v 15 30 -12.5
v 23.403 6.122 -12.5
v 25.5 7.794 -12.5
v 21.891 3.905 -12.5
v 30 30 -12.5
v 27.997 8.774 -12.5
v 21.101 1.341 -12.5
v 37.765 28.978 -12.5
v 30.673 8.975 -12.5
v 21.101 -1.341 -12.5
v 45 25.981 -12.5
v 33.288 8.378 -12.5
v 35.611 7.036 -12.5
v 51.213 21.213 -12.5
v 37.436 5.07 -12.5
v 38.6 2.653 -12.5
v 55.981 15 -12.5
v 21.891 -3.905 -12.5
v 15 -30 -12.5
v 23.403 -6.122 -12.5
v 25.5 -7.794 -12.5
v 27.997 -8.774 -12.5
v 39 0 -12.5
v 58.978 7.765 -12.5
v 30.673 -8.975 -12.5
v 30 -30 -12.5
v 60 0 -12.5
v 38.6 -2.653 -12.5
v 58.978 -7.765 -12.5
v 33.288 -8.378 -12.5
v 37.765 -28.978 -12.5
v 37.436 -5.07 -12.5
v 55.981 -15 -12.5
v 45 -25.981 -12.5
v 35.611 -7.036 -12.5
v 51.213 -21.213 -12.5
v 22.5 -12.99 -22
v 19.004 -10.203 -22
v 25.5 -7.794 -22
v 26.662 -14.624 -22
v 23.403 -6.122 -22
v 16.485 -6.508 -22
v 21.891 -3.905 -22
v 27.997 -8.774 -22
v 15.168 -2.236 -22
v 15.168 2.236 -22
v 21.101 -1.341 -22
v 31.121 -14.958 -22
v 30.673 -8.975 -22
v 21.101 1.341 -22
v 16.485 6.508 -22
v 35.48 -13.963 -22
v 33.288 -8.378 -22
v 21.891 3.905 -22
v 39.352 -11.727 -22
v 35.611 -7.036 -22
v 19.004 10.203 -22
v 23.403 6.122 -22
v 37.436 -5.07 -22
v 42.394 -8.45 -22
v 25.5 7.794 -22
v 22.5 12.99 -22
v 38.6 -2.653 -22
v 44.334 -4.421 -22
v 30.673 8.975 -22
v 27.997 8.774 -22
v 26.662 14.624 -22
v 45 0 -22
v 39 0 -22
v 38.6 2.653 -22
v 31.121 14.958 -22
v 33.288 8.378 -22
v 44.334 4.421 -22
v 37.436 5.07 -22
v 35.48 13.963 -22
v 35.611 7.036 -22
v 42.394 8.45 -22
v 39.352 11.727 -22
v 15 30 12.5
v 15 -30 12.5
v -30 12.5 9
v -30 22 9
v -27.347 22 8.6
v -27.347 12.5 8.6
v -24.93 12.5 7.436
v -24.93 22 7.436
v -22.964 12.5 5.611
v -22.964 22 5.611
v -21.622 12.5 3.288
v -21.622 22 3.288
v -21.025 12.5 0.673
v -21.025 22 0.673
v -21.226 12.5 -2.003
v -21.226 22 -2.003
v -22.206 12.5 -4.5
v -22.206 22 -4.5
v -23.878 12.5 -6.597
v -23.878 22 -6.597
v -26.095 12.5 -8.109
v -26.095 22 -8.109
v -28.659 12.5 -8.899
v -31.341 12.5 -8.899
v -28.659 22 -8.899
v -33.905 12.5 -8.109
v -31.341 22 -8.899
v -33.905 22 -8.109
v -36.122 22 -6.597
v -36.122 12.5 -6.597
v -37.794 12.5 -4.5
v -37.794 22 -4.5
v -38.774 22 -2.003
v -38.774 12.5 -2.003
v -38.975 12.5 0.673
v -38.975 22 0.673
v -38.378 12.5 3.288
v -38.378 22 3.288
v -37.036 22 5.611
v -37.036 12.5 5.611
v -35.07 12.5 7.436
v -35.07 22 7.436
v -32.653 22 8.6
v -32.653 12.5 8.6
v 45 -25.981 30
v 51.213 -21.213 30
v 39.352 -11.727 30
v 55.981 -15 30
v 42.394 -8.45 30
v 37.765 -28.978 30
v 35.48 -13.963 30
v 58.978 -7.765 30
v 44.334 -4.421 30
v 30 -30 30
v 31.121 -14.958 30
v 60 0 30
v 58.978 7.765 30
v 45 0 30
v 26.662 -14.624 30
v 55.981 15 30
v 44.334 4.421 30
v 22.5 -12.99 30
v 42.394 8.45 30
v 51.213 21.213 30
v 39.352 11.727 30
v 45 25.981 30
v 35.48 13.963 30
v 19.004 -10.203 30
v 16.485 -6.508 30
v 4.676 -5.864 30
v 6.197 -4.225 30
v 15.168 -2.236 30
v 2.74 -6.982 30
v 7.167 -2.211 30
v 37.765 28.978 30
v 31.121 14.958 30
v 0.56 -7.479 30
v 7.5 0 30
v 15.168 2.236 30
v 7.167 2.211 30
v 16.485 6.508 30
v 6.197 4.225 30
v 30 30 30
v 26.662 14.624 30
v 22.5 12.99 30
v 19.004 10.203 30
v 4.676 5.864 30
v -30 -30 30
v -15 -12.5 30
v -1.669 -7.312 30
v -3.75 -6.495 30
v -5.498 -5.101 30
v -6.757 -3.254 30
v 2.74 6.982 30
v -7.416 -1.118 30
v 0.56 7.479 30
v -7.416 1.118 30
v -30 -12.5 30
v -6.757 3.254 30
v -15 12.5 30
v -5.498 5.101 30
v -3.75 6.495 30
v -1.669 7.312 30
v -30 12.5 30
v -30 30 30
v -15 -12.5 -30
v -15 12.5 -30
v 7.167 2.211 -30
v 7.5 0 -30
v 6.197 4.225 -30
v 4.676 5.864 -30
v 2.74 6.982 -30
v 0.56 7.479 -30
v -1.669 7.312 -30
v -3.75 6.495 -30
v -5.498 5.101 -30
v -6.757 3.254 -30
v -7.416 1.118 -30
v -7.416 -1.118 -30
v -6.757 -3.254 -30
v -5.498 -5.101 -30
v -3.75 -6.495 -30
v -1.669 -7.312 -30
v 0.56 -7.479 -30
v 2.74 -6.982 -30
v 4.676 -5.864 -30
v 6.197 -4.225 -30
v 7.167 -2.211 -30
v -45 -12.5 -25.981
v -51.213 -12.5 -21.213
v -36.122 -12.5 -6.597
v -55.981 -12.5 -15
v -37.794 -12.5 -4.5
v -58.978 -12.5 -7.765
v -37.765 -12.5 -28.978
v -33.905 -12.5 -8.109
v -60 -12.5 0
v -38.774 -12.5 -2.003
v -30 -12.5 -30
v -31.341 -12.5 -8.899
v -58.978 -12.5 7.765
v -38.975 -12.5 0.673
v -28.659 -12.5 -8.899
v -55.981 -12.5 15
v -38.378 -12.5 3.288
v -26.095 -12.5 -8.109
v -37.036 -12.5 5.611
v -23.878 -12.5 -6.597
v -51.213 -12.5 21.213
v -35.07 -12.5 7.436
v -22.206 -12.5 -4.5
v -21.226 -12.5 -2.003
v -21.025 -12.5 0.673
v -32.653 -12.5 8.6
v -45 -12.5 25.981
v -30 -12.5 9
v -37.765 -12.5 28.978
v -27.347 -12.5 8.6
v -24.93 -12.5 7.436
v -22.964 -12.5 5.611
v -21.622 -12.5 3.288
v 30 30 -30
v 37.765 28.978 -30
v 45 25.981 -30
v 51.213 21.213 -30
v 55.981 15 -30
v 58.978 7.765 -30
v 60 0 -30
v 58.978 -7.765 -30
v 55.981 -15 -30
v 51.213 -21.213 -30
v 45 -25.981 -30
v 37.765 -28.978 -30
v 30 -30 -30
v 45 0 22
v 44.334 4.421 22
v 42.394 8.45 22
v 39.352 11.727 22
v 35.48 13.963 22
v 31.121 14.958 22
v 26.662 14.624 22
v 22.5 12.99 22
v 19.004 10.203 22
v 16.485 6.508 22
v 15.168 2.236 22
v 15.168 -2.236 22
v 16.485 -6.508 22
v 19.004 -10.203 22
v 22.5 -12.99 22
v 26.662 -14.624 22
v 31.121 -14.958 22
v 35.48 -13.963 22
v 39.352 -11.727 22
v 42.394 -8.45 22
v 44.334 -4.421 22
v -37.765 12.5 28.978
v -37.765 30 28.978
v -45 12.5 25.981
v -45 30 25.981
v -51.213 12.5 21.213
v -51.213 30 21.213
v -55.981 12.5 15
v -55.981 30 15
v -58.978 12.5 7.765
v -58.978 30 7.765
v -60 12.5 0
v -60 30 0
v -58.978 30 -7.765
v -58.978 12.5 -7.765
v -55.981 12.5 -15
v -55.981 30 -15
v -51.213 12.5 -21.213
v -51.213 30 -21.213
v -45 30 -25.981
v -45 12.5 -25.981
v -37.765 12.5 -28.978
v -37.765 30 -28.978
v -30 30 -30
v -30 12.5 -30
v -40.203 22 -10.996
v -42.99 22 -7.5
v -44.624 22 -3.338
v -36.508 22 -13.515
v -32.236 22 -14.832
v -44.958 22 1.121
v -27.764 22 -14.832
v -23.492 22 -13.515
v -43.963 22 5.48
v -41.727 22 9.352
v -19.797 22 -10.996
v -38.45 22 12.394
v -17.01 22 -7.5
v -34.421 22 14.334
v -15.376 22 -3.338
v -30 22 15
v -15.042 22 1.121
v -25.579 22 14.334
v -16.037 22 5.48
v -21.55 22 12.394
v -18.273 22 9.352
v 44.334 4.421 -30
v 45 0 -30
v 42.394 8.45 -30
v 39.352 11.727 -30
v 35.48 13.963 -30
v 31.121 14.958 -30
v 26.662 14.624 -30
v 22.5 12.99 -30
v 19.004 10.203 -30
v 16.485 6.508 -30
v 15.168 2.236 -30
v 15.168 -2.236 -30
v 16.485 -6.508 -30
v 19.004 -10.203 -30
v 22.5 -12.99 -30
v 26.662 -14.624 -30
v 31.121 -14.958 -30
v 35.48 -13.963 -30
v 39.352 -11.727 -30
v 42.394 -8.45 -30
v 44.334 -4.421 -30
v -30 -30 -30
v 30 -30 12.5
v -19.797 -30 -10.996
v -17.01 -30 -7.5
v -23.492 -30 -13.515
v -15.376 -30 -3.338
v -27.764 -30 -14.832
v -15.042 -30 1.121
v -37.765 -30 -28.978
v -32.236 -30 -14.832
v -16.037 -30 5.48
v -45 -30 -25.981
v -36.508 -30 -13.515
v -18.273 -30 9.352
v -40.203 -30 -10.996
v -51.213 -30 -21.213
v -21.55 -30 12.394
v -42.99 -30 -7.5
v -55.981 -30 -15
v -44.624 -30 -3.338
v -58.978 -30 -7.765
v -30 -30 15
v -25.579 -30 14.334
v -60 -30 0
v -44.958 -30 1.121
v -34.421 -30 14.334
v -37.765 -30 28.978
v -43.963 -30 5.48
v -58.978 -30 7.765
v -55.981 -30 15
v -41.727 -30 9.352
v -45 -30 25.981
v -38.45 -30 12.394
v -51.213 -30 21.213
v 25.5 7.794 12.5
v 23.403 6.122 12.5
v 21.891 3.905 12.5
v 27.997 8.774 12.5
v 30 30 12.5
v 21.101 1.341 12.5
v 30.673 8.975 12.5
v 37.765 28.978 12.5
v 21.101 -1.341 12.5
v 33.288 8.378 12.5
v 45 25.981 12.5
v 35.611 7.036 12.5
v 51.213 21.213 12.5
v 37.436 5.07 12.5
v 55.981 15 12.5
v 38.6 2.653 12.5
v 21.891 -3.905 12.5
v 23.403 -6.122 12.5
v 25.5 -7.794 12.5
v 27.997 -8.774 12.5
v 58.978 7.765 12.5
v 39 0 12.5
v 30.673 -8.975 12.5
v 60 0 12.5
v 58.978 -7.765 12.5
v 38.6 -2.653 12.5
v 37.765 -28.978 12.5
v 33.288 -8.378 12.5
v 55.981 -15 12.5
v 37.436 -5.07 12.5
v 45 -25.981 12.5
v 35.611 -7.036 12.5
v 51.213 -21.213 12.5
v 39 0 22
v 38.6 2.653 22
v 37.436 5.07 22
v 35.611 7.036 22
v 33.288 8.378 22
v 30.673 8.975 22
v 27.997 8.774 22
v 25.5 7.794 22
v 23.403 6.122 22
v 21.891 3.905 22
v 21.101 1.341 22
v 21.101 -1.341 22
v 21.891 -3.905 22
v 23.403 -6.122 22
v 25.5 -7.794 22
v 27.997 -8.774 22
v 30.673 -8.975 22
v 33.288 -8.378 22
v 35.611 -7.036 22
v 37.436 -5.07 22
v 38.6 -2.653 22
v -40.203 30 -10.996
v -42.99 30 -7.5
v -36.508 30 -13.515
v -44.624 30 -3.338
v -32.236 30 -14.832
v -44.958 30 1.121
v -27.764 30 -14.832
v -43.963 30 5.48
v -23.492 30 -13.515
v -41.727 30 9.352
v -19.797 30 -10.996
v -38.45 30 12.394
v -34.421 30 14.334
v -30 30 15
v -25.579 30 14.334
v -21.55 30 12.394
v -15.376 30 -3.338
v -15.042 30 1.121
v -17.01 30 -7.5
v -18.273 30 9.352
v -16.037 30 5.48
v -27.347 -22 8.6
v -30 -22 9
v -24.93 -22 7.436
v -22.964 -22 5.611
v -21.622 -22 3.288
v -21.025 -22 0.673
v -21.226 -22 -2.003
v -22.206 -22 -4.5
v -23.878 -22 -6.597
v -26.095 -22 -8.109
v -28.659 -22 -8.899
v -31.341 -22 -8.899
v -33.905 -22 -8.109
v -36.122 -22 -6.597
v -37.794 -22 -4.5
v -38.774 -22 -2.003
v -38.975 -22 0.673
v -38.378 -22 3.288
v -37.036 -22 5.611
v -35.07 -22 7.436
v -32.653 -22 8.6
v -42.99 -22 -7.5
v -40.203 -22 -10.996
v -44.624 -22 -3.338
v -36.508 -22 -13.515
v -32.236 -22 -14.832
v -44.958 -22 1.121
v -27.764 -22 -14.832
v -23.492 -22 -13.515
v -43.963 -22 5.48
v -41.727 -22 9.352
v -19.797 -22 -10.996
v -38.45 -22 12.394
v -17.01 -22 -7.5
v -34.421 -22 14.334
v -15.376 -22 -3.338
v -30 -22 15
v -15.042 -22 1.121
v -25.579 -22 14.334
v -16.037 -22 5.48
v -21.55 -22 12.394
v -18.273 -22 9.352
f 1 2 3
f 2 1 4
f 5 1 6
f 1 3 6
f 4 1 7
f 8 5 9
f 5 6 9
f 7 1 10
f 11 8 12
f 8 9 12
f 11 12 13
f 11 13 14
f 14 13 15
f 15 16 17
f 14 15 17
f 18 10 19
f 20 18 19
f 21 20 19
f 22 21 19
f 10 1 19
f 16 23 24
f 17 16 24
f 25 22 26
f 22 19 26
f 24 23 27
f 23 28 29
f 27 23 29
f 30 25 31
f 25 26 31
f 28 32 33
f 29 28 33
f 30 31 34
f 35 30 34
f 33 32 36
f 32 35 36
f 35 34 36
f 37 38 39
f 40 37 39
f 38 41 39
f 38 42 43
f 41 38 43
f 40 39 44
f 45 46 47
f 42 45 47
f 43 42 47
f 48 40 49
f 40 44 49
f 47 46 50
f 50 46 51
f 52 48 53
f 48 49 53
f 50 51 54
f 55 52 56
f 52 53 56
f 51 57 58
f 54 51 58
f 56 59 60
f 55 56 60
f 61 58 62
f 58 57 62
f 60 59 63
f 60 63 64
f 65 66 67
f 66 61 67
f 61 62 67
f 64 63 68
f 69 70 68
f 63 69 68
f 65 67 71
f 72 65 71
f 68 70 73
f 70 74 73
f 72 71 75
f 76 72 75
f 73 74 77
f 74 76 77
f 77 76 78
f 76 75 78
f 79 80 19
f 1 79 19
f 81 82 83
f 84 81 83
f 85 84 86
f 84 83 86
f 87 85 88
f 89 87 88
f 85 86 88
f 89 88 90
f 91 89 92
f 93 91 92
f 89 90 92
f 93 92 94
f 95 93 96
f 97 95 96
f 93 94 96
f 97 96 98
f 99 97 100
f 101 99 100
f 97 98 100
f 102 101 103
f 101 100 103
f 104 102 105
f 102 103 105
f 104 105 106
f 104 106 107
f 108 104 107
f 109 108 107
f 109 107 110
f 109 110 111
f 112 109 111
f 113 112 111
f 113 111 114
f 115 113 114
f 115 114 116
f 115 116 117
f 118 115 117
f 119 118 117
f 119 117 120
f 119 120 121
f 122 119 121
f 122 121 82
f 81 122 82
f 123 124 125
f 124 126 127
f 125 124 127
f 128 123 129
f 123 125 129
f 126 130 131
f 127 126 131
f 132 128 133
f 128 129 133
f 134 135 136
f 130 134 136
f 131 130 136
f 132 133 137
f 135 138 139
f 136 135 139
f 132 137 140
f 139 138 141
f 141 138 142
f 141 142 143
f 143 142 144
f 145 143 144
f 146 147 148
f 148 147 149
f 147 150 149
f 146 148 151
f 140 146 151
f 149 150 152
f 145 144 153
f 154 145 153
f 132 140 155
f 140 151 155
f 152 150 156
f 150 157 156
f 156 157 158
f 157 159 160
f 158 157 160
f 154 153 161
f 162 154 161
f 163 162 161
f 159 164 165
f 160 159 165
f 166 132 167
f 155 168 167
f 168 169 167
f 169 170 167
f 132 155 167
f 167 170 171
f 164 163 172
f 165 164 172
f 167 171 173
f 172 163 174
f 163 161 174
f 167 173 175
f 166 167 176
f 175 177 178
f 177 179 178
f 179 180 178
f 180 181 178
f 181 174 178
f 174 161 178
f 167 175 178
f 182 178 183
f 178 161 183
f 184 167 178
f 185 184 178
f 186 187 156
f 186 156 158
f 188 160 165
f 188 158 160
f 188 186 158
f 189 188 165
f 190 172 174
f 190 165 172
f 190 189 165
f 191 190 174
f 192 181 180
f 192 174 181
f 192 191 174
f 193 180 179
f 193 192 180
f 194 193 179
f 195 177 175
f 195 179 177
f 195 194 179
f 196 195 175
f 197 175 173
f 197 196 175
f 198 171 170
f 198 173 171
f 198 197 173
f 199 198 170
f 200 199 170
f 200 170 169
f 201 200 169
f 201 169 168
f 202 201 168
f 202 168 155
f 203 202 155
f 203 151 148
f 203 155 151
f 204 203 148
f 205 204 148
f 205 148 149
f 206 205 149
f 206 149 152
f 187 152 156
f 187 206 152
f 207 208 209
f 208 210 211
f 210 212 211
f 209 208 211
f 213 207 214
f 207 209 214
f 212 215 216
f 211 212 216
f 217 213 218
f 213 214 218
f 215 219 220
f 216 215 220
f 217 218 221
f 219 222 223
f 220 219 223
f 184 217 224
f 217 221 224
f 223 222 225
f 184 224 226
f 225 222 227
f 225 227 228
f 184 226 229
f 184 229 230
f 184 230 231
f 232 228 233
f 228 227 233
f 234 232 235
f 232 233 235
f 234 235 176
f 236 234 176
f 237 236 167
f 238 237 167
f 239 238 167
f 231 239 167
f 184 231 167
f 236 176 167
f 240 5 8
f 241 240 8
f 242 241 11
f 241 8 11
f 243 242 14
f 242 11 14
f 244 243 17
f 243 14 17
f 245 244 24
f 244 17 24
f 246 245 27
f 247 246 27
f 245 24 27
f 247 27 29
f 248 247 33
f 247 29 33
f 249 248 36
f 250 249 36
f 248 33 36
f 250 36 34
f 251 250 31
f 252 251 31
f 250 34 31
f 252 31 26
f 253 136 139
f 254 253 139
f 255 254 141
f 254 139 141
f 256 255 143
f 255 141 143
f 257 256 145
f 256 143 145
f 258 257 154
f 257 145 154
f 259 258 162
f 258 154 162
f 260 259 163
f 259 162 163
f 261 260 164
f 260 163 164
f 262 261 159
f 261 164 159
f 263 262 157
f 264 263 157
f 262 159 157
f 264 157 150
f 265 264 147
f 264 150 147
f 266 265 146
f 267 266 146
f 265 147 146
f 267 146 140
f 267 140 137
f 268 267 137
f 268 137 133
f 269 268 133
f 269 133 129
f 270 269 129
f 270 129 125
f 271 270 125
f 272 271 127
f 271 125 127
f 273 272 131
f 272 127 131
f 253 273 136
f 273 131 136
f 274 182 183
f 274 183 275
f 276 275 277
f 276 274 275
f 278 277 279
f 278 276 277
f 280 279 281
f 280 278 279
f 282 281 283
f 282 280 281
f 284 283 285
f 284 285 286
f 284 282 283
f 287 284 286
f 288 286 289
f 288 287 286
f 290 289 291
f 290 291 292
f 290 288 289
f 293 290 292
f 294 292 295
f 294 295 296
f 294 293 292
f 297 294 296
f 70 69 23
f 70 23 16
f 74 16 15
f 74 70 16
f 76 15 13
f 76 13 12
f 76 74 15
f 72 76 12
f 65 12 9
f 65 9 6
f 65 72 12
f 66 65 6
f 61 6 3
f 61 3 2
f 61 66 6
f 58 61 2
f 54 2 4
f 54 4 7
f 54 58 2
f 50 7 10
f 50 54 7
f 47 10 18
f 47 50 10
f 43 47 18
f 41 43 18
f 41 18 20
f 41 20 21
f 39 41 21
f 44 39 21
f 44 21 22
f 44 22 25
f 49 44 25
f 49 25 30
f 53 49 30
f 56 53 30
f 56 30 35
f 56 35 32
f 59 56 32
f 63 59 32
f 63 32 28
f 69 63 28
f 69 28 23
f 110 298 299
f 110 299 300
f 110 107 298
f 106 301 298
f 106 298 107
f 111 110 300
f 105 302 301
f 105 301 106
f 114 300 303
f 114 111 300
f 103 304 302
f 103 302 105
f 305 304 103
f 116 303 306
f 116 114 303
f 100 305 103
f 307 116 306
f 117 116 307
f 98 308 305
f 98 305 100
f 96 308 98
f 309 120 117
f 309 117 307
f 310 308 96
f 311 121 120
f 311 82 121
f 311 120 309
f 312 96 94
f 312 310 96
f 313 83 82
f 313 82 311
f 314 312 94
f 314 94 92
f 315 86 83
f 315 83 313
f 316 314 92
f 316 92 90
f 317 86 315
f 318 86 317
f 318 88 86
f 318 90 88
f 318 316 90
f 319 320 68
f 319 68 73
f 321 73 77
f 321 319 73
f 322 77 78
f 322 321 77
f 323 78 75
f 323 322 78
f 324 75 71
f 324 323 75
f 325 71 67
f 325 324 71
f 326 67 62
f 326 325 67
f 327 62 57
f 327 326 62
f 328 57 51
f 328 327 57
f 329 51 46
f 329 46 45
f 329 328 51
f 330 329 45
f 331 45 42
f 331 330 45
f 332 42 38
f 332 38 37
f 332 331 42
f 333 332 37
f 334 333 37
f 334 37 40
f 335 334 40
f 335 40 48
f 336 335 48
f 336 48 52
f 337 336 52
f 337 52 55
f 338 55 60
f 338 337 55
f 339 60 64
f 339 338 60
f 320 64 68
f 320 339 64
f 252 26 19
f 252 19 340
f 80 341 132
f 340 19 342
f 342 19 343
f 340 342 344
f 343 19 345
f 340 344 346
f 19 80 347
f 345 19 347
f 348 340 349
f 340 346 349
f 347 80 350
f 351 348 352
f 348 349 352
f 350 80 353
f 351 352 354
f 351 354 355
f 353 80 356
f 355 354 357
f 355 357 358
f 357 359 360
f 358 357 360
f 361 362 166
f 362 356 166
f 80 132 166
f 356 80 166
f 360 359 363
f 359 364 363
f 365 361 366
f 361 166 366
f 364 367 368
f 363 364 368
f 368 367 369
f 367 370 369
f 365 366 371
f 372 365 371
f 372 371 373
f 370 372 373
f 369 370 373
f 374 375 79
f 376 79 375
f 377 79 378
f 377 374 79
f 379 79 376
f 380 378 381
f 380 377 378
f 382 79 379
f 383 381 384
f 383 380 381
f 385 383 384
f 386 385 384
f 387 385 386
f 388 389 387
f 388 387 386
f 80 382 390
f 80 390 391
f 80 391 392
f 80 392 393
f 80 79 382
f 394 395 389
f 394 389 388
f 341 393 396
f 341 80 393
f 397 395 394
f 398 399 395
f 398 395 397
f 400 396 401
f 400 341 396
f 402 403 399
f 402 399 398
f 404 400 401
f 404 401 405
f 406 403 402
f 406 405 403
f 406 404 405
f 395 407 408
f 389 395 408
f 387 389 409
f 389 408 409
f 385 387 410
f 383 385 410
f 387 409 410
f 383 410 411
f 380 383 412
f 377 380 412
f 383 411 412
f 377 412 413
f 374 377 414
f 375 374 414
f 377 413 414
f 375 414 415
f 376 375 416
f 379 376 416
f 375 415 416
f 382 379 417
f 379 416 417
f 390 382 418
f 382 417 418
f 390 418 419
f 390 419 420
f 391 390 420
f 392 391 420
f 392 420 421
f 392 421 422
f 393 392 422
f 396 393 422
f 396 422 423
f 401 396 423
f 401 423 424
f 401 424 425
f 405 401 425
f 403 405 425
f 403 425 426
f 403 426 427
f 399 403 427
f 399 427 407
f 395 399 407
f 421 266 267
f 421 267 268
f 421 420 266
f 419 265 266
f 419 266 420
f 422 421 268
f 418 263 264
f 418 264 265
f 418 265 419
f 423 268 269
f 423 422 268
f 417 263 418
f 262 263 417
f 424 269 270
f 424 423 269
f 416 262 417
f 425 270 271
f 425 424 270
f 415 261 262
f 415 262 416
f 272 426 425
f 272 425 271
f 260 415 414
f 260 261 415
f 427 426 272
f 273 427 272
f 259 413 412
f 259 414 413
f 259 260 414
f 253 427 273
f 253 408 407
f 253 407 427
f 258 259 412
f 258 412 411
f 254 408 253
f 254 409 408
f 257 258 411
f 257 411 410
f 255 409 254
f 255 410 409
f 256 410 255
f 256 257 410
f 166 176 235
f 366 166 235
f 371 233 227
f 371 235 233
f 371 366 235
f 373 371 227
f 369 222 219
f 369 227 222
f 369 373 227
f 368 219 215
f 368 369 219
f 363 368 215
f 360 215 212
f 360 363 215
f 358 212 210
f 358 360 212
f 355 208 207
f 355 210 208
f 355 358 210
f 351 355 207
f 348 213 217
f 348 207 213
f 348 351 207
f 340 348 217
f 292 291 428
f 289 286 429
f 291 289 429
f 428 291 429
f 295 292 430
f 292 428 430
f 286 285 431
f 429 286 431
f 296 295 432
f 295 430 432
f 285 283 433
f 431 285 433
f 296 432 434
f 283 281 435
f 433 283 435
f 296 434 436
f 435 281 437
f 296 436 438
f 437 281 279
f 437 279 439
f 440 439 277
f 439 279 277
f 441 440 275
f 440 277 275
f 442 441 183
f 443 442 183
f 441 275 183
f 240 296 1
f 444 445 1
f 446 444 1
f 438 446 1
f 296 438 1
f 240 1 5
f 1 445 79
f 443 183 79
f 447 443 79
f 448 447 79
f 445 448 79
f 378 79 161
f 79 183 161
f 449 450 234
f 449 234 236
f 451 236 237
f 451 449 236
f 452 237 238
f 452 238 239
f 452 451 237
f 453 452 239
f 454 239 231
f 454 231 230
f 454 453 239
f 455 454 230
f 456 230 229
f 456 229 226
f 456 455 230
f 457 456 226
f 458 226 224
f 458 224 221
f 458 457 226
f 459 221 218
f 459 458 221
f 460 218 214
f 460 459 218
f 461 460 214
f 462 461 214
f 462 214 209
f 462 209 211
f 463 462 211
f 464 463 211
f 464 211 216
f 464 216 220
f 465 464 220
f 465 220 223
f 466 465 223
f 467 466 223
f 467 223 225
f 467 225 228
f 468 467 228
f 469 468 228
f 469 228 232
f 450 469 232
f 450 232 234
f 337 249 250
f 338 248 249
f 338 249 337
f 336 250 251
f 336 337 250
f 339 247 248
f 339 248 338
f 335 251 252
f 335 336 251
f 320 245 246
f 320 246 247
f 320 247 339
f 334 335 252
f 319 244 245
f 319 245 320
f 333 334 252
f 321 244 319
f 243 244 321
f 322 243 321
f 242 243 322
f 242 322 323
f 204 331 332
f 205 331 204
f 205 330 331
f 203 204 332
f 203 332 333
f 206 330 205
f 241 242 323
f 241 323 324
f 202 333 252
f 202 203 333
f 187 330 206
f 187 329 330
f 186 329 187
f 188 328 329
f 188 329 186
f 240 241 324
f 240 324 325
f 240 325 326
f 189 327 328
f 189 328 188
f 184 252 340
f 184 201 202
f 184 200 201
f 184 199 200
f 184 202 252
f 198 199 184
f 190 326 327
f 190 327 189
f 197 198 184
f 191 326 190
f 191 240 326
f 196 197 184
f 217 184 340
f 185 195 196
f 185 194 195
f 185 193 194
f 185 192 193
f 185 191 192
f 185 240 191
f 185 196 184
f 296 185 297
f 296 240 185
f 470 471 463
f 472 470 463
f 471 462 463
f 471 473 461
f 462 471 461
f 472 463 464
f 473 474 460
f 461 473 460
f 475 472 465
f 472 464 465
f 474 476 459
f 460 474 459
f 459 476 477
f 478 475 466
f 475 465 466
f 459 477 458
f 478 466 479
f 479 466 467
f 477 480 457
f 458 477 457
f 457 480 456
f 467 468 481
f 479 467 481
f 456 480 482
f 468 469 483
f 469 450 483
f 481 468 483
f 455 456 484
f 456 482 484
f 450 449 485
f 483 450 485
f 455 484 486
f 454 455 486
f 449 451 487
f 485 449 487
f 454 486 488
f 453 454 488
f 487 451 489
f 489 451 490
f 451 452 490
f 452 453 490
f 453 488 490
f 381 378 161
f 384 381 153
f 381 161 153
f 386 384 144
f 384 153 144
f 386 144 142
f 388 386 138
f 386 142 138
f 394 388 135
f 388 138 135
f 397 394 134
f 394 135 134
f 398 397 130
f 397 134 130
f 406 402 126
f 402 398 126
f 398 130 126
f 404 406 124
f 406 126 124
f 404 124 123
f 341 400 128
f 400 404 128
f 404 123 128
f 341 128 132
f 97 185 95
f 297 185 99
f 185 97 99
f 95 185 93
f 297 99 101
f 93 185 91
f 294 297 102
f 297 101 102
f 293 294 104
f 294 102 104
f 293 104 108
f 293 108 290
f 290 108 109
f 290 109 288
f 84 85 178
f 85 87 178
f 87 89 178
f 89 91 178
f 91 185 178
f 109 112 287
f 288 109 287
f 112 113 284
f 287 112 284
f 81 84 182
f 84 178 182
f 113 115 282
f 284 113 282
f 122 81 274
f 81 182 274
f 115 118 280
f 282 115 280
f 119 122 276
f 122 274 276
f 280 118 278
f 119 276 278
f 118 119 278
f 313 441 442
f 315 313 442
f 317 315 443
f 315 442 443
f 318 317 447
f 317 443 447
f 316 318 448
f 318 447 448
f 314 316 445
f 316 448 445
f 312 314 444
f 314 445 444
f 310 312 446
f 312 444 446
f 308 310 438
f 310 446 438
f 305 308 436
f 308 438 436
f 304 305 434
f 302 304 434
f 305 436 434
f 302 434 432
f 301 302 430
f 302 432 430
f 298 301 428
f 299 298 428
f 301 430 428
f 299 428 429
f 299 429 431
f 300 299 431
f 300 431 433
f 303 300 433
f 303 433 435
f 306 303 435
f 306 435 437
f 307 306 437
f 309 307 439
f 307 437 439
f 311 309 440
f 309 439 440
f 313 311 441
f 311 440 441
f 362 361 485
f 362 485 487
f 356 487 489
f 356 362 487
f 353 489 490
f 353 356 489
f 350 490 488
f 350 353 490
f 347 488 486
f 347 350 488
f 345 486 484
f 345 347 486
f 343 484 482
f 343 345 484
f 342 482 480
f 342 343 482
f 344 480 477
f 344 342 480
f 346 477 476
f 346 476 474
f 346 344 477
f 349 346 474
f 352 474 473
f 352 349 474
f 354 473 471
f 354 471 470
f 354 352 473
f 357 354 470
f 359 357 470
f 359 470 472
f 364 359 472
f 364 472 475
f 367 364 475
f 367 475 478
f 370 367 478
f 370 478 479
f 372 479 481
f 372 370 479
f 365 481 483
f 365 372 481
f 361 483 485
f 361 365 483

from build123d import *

# Parameters (mm, degrees)
BOSS_EXTRUDE1_DEPTH     = 30
CUT_EXTRUDE1_DEPTH      = 74.484692283
CUT_EXTRUDE1_DEPTH_BACK = 74.484692283
SKETCH3_R               = 7.5
CUT_EXTRUDE2_DEPTH      = 91
CUT_EXTRUDE2_DEPTH_BACK = 91
SKETCH5_R               = 15
CUT_EXTRUDE3_DEPTH      = 8
CUT_EXTRUDE4_REACH      = 86.876
SKETCH6_R               = 9
CUT_EXTRUDE5_DEPTH      = 74.484692283
CUT_EXTRUDE5_DEPTH_BACK = 74.484692283
SKETCH7_W               = 45
SKETCH7_H               = 25
SKETCH8_R               = 15
CUT_EXTRUDE6_DEPTH      = 8
CUT_EXTRUDE7_REACH      = 86.876
SKETCH9_R               = 9


with BuildPart() as part:
    # Sketch1 → Boss-Extrude1 (new, symmetric)
    with BuildSketch(Plane.XY):
        with BuildLine():
            Line((-60, 12.5), (-60, 30))
            Line((-60, 30), (30, 30))
            ThreePointArc((30, 30), (60, 0), (30, -30))
            Line((30, -30), (-60, -30))
            Line((-60, -30), (-60, -12.5))
            Line((-60, -12.5), (-15, -12.5))
            Line((-15, -12.5), (-15, 12.5))
            Line((-15, 12.5), (-60, 12.5))
        make_face()
    extrude(amount=BOSS_EXTRUDE1_DEPTH, both=True)

    # Sketch3 → Cut-Extrude1 (cut, two sides: drawn at the far end of the back side and taken through both)
    with BuildSketch(Plane.XY.offset(-CUT_EXTRUDE1_DEPTH_BACK)):
        Circle(SKETCH3_R)
    extrude(amount=CUT_EXTRUDE1_DEPTH + CUT_EXTRUDE1_DEPTH_BACK, mode=Mode.SUBTRACT)

    # Sketch4 → Cut-Extrude2 (cut, two sides: drawn at the far end of the back side and taken through both)
    with BuildSketch(Plane(origin=(0, 30, 0), x_dir=(1, 0, 0), z_dir=(0, 1, 0)).offset(-CUT_EXTRUDE2_DEPTH_BACK)):
        with BuildLine():
            Line((-30, 30), (-30, 42.770577687))
            Line((-30, 42.770577687), (-70.432292605, 42.770577687))
            Line((-70.432292605, 42.770577687), (-70.432292605, -35.727348426))
            Line((-70.432292605, -35.727348426), (-30, -35.727348426))
            Line((-30, -35.727348426), (-30, -30))
            ThreePointArc((-30, -30), (-60, 0), (-30, 30))
        make_face()
    extrude(amount=CUT_EXTRUDE2_DEPTH + CUT_EXTRUDE2_DEPTH_BACK, mode=Mode.SUBTRACT)

    # Sketch5 → Cut-Extrude3 (cut)
    with BuildSketch(Plane(origin=(0, 30, 0), x_dir=(1, 0, 0), z_dir=(0, 1, 0))):
        with Locations(Location((-30, 0, 0), (0, 0, 270))):
            Circle(SKETCH5_R)
    cut_extrude3 = extrude(amount=-CUT_EXTRUDE3_DEPTH, mode=Mode.SUBTRACT)

    # Sketch6 → Cut-Extrude4 (cut, up to next)
    with BuildSketch(Plane(origin=(0, 22, 0), x_dir=(1, 0, 0), z_dir=(0, 1, 0)), mode=Mode.PRIVATE) as cut_extrude4_sk1:
        with Locations(Location((-30, 0, 0), (0, 0, 270))):
            Circle(SKETCH6_R)
    cut_extrude4_tool1 = extrude(cut_extrude4_sk1.sketch, amount=-CUT_EXTRUDE4_REACH, mode=Mode.PRIVATE) & part.part
    cut_extrude4 = cut_extrude4_tool1.solids().sort_by_distance((-30, 22, 0))[0]
    add(cut_extrude4, mode=Mode.SUBTRACT)

    # Mirror1: Cut-Extrude3, Cut-Extrude4 across plane
    add(cut_extrude3.mirror(Plane.ZX), mode=Mode.SUBTRACT)
    add(cut_extrude4.mirror(Plane.ZX), mode=Mode.SUBTRACT)

    # Sketch7 → Cut-Extrude5 (cut, two sides: drawn at the far end of the back side and taken through both)
    with BuildSketch(Plane(origin=(0, 0, 0), x_dir=(1, 0, 0), z_dir=(0, 1, 0)).offset(-CUT_EXTRUDE5_DEPTH_BACK)):
        with Locations((37.5, 0)):
            Rectangle(SKETCH7_W, SKETCH7_H)
    extrude(amount=CUT_EXTRUDE5_DEPTH + CUT_EXTRUDE5_DEPTH_BACK, mode=Mode.SUBTRACT)

    # Sketch8 → Cut-Extrude6 (cut)
    with BuildSketch(Plane.XY.offset(30)):
        with Locations((30, 0)):
            Circle(SKETCH8_R)
    cut_extrude6 = extrude(amount=-CUT_EXTRUDE6_DEPTH, mode=Mode.SUBTRACT)

    # Sketch9 → Cut-Extrude7 (cut, up to next)
    with BuildSketch(Plane.XY.offset(22), mode=Mode.PRIVATE) as cut_extrude7_sk1:
        with Locations((30, 0)):
            Circle(SKETCH9_R)
    cut_extrude7_tool1 = extrude(cut_extrude7_sk1.sketch, amount=-CUT_EXTRUDE7_REACH, mode=Mode.PRIVATE) & part.part
    cut_extrude7 = cut_extrude7_tool1.solids().sort_by_distance((30, 0, 22))[0]
    add(cut_extrude7, mode=Mode.SUBTRACT)

    # Mirror2: Cut-Extrude6, Cut-Extrude7 across plane
    add(cut_extrude6.mirror(Plane.XY), mode=Mode.SUBTRACT)
    add(cut_extrude7.mirror(Plane.XY), mode=Mode.SUBTRACT)


solid = part.part
